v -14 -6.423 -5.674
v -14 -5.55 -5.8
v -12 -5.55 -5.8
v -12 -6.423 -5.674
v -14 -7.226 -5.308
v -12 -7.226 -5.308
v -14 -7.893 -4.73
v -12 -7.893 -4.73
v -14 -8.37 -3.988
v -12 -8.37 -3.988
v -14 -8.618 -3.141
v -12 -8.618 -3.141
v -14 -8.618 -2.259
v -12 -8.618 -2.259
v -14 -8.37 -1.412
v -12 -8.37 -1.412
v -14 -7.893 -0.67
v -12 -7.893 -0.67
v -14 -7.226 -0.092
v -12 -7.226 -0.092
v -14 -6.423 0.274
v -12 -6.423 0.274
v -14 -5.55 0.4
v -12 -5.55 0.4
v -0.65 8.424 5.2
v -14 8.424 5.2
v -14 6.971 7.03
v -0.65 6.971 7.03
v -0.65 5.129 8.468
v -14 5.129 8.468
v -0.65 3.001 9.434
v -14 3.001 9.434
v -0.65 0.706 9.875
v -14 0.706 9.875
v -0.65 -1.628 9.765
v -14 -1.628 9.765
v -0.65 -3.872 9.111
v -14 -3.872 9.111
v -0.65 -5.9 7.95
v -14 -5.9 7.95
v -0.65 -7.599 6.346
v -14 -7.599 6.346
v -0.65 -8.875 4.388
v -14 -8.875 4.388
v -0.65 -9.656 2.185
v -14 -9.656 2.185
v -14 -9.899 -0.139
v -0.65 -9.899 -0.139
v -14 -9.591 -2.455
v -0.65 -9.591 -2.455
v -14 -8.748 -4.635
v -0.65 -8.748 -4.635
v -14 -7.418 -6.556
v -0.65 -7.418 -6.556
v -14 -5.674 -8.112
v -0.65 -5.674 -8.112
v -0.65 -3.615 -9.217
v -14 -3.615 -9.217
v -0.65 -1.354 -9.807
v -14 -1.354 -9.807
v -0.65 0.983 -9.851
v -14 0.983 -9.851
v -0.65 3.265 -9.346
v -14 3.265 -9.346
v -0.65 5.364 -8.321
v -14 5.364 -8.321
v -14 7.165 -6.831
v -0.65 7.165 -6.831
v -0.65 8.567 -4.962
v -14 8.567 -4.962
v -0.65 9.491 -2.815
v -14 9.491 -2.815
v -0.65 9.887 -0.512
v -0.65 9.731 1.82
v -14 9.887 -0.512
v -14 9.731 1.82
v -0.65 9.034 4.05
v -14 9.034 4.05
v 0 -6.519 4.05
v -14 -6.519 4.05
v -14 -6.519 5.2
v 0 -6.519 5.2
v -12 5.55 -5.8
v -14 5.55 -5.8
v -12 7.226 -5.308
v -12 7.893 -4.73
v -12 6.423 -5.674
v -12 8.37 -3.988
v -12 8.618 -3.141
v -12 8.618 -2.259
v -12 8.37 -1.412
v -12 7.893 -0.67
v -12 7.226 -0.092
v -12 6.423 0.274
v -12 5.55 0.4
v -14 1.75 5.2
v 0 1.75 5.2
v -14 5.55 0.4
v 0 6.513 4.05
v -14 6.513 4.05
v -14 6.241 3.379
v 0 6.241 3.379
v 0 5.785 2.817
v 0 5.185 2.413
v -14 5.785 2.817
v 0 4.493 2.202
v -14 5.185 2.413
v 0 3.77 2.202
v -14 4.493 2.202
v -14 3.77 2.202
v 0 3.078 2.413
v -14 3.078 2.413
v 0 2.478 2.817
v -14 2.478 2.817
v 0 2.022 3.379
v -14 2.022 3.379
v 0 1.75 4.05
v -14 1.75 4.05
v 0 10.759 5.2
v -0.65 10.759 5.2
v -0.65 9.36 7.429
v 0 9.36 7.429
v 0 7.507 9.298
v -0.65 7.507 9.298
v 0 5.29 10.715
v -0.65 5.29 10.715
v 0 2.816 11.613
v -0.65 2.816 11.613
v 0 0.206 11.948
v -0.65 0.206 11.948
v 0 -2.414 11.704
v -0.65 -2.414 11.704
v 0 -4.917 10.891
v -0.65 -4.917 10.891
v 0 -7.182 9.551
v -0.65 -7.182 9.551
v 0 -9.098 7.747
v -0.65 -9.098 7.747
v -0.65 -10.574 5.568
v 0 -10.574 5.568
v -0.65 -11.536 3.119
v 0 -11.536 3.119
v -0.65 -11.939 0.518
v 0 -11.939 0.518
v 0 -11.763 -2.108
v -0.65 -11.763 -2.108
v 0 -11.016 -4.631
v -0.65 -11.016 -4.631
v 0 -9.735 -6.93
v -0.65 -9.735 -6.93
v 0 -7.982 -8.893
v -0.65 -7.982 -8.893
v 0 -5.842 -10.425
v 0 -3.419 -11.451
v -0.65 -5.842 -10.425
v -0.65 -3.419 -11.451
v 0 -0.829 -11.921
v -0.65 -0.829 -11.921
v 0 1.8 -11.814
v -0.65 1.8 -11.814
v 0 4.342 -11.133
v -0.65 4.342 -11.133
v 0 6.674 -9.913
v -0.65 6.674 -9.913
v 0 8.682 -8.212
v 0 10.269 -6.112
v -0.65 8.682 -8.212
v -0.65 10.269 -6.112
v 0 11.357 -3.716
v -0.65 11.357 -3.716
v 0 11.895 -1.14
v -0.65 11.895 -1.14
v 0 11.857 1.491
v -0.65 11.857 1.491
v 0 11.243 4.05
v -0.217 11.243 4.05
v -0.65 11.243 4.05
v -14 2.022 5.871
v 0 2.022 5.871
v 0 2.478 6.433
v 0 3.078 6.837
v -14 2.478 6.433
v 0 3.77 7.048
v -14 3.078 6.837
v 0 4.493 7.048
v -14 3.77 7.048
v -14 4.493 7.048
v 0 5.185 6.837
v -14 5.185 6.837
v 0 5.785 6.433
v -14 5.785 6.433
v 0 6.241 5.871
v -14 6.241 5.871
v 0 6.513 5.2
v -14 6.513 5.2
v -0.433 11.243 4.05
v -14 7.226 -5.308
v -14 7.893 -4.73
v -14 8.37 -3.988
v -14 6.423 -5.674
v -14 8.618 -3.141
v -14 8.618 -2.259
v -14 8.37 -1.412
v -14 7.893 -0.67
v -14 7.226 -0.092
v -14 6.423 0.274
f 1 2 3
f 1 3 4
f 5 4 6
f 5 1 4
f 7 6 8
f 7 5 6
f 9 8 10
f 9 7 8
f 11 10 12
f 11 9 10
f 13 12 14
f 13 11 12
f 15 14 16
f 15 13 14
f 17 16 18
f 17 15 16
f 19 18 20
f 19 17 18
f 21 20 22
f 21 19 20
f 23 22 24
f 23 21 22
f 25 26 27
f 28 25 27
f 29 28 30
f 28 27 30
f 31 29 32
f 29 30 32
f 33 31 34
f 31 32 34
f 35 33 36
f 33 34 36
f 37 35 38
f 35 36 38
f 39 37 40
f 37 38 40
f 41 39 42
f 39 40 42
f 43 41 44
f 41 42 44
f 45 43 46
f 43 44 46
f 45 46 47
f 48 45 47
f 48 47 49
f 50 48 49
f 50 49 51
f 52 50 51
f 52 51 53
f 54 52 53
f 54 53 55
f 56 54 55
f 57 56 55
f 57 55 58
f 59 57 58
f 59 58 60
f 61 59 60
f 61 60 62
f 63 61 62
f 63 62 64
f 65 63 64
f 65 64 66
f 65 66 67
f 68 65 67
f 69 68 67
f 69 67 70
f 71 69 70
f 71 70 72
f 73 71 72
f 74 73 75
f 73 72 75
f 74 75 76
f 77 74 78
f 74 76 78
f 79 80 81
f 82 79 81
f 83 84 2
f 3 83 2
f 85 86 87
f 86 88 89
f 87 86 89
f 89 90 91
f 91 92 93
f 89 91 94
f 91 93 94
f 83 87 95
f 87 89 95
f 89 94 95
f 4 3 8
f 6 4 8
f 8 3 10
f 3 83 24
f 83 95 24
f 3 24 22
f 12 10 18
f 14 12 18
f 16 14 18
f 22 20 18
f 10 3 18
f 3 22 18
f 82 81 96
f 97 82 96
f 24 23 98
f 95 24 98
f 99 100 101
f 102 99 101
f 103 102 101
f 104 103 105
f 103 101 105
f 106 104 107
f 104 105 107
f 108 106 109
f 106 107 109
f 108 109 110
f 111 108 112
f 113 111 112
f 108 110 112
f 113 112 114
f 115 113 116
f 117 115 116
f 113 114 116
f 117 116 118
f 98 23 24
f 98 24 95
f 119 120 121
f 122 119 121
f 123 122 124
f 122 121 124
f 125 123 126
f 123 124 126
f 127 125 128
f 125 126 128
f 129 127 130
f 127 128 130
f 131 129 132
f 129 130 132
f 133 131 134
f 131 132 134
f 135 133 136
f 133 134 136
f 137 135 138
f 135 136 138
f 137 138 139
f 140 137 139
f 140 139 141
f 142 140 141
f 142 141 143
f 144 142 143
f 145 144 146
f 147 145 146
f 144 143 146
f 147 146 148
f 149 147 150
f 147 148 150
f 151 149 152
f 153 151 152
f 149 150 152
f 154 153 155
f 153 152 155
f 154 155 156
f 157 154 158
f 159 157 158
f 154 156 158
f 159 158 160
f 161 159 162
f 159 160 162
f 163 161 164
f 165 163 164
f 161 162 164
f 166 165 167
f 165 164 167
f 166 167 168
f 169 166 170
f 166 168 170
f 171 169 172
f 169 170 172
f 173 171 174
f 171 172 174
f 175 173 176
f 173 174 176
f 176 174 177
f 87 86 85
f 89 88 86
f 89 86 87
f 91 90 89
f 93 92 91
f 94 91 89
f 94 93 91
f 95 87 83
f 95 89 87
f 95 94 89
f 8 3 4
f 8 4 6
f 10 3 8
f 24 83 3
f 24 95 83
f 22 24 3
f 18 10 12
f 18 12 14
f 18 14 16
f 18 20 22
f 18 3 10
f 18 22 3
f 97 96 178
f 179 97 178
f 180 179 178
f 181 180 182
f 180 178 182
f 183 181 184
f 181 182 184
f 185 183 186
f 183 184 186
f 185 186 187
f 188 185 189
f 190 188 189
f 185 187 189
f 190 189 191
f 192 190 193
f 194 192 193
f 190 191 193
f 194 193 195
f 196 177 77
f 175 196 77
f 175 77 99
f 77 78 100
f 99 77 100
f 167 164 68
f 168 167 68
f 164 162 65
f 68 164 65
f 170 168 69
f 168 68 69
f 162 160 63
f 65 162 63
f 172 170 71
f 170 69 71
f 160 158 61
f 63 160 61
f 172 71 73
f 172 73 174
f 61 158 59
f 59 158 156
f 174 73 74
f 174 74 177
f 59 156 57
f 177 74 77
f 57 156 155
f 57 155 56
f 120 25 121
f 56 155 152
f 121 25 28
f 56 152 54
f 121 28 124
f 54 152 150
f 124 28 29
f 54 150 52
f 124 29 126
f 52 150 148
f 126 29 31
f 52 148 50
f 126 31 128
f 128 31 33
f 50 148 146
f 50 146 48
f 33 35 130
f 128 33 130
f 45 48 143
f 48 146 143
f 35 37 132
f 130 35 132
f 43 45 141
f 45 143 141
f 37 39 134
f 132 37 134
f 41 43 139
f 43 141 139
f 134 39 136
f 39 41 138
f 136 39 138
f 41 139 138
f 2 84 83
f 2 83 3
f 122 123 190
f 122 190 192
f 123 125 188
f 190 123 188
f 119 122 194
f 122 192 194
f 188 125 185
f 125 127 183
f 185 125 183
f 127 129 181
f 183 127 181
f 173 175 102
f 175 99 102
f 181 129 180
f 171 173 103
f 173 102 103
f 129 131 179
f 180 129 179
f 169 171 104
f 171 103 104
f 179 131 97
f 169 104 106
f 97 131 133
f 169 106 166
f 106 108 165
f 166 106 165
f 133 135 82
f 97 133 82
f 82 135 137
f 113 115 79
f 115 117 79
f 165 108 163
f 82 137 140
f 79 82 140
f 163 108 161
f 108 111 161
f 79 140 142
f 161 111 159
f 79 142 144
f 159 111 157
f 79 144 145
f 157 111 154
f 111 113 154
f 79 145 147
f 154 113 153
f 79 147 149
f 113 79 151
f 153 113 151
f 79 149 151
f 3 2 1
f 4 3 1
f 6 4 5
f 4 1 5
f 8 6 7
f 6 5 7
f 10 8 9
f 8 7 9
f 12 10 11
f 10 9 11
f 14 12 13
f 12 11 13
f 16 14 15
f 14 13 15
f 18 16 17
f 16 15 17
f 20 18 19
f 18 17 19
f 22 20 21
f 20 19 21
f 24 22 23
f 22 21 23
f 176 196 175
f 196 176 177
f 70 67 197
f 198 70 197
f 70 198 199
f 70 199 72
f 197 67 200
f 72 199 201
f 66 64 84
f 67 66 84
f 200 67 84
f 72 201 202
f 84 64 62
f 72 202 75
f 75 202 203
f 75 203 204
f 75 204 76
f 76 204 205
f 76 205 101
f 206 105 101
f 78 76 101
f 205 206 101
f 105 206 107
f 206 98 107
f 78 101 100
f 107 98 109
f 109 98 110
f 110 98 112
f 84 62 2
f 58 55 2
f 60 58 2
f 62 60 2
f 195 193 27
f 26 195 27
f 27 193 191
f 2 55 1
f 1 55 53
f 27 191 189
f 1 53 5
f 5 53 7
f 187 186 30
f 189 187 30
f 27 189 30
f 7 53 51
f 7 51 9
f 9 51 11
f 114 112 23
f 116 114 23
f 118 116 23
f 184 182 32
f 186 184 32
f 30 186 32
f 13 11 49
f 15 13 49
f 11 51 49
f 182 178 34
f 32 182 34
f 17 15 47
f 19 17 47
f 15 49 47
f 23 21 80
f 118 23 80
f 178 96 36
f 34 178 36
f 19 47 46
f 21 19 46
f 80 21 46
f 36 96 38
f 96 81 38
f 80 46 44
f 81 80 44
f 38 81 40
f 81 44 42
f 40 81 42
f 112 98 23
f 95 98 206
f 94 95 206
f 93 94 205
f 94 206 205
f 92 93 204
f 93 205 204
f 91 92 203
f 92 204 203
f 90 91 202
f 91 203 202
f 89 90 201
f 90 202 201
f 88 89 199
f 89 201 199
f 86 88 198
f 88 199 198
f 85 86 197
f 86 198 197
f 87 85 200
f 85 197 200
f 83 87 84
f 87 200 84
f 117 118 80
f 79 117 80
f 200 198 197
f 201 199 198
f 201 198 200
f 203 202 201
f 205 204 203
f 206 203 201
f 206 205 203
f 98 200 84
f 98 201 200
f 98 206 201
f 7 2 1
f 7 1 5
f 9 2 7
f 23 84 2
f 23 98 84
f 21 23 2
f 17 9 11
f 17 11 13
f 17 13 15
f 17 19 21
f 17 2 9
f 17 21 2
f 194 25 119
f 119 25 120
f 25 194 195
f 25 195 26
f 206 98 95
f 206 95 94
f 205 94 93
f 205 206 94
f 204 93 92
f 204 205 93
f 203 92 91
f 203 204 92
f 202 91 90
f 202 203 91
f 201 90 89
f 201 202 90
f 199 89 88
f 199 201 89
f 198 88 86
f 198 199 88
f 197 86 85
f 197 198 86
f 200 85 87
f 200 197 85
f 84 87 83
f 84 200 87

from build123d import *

# Parameters (mm, degrees)
F3_DEPTH = 14.001
F4_DEPTH = 14.001
F6_DEPTH = 2
F7_DEPTH = 2


with BuildPart() as f1:
    # F0 (on Front) → F1 (revolve)
    with BuildSketch(Plane.XZ):
        Polygon((-14, 0), (0, 0), (0, 11.95), (-0.65, 11.95), (-0.65, 9.9), (-14, 9.9), align=None)
    revolve(axis=Axis((-7, 0, 0), (1, 0, 0)))

    # F2 (on face) → F3 (cut, through all)
    with BuildSketch(Plane(origin=(-14, 0, 0), x_dir=(0, -1, 0), z_dir=(-1, 0, 0))):
        with BuildLine():
            Line((6.518706, 5.2), (-1.75, 5.2))
            ThreePointArc((-1.75, 5.2), (-4.13157, 7.075), (-6.51314, 5.2))
            Line((-6.51314, 5.2), (-11.242775, 5.2))
            Line((-11.242775, 5.2), (-11.242775, 4.05))
            Line((-11.242775, 4.05), (-6.51314, 4.05))
            ThreePointArc((-6.51314, 4.05), (-4.13157, 2.175), (-1.75, 4.05))
            Line((-1.75, 4.05), (6.518706, 4.05))
            Line((6.518706, 4.05), (6.518706, 5.2))
        make_face()
    extrude(amount=-F3_DEPTH, mode=Mode.SUBTRACT)

    # F2 (on face) → F4 (cut, through all)
    with BuildSketch(Plane(origin=(-14, 0, 0), x_dir=(0, -1, 0), z_dir=(-1, 0, 0))):
        with BuildLine():
            Line((6.518706, 5.2), (-1.75, 5.2))
            ThreePointArc((-1.75, 5.2), (-4.13157, 7.075), (-6.51314, 5.2))
            Line((-6.51314, 5.2), (-11.242775, 5.2))
            Line((-11.242775, 5.2), (-11.242775, 4.05))
            Line((-11.242775, 4.05), (-6.51314, 4.05))
            ThreePointArc((-6.51314, 4.05), (-4.13157, 2.175), (-1.75, 4.05))
            Line((-1.75, 4.05), (6.518706, 4.05))
            Line((6.518706, 4.05), (6.518706, 5.2))
        make_face()
    extrude(amount=-F4_DEPTH, mode=Mode.SUBTRACT)

    # F5 (on face) → F6 (cut)
    with BuildSketch(Plane(origin=(-14, 0, 0), x_dir=(0, -1, 0), z_dir=(-1, 0, 0))):
        with BuildLine():
            ThreePointArc((5.55, -5.8), (8.65, -2.7), (5.55, 0.4))
            Line((5.55, 0.4), (-5.55, 0.4))
            ThreePointArc((-5.55, 0.4), (-8.65, -2.7), (-5.55, -5.8))
            Line((-5.55, -5.8), (5.55, -5.8))
        make_face()
    extrude(amount=-F6_DEPTH, mode=Mode.SUBTRACT)


with BuildPart() as f7:
    # F5 (on face) → F7 (new body, through all)
    with BuildSketch(Plane(origin=(-14, 0, 0), x_dir=(0, -1, 0), z_dir=(-1, 0, 0))):
        with BuildLine():
            ThreePointArc((5.55, -5.8), (8.65, -2.7), (5.55, 0.4))
            Line((5.55, 0.4), (-5.55, 0.4))
            ThreePointArc((-5.55, 0.4), (-8.65, -2.7), (-5.55, -5.8))
            Line((-5.55, -5.8), (5.55, -5.8))
        make_face()
    extrude(amount=-F7_DEPTH)


solid = Compound([f1.part, f7.part])
